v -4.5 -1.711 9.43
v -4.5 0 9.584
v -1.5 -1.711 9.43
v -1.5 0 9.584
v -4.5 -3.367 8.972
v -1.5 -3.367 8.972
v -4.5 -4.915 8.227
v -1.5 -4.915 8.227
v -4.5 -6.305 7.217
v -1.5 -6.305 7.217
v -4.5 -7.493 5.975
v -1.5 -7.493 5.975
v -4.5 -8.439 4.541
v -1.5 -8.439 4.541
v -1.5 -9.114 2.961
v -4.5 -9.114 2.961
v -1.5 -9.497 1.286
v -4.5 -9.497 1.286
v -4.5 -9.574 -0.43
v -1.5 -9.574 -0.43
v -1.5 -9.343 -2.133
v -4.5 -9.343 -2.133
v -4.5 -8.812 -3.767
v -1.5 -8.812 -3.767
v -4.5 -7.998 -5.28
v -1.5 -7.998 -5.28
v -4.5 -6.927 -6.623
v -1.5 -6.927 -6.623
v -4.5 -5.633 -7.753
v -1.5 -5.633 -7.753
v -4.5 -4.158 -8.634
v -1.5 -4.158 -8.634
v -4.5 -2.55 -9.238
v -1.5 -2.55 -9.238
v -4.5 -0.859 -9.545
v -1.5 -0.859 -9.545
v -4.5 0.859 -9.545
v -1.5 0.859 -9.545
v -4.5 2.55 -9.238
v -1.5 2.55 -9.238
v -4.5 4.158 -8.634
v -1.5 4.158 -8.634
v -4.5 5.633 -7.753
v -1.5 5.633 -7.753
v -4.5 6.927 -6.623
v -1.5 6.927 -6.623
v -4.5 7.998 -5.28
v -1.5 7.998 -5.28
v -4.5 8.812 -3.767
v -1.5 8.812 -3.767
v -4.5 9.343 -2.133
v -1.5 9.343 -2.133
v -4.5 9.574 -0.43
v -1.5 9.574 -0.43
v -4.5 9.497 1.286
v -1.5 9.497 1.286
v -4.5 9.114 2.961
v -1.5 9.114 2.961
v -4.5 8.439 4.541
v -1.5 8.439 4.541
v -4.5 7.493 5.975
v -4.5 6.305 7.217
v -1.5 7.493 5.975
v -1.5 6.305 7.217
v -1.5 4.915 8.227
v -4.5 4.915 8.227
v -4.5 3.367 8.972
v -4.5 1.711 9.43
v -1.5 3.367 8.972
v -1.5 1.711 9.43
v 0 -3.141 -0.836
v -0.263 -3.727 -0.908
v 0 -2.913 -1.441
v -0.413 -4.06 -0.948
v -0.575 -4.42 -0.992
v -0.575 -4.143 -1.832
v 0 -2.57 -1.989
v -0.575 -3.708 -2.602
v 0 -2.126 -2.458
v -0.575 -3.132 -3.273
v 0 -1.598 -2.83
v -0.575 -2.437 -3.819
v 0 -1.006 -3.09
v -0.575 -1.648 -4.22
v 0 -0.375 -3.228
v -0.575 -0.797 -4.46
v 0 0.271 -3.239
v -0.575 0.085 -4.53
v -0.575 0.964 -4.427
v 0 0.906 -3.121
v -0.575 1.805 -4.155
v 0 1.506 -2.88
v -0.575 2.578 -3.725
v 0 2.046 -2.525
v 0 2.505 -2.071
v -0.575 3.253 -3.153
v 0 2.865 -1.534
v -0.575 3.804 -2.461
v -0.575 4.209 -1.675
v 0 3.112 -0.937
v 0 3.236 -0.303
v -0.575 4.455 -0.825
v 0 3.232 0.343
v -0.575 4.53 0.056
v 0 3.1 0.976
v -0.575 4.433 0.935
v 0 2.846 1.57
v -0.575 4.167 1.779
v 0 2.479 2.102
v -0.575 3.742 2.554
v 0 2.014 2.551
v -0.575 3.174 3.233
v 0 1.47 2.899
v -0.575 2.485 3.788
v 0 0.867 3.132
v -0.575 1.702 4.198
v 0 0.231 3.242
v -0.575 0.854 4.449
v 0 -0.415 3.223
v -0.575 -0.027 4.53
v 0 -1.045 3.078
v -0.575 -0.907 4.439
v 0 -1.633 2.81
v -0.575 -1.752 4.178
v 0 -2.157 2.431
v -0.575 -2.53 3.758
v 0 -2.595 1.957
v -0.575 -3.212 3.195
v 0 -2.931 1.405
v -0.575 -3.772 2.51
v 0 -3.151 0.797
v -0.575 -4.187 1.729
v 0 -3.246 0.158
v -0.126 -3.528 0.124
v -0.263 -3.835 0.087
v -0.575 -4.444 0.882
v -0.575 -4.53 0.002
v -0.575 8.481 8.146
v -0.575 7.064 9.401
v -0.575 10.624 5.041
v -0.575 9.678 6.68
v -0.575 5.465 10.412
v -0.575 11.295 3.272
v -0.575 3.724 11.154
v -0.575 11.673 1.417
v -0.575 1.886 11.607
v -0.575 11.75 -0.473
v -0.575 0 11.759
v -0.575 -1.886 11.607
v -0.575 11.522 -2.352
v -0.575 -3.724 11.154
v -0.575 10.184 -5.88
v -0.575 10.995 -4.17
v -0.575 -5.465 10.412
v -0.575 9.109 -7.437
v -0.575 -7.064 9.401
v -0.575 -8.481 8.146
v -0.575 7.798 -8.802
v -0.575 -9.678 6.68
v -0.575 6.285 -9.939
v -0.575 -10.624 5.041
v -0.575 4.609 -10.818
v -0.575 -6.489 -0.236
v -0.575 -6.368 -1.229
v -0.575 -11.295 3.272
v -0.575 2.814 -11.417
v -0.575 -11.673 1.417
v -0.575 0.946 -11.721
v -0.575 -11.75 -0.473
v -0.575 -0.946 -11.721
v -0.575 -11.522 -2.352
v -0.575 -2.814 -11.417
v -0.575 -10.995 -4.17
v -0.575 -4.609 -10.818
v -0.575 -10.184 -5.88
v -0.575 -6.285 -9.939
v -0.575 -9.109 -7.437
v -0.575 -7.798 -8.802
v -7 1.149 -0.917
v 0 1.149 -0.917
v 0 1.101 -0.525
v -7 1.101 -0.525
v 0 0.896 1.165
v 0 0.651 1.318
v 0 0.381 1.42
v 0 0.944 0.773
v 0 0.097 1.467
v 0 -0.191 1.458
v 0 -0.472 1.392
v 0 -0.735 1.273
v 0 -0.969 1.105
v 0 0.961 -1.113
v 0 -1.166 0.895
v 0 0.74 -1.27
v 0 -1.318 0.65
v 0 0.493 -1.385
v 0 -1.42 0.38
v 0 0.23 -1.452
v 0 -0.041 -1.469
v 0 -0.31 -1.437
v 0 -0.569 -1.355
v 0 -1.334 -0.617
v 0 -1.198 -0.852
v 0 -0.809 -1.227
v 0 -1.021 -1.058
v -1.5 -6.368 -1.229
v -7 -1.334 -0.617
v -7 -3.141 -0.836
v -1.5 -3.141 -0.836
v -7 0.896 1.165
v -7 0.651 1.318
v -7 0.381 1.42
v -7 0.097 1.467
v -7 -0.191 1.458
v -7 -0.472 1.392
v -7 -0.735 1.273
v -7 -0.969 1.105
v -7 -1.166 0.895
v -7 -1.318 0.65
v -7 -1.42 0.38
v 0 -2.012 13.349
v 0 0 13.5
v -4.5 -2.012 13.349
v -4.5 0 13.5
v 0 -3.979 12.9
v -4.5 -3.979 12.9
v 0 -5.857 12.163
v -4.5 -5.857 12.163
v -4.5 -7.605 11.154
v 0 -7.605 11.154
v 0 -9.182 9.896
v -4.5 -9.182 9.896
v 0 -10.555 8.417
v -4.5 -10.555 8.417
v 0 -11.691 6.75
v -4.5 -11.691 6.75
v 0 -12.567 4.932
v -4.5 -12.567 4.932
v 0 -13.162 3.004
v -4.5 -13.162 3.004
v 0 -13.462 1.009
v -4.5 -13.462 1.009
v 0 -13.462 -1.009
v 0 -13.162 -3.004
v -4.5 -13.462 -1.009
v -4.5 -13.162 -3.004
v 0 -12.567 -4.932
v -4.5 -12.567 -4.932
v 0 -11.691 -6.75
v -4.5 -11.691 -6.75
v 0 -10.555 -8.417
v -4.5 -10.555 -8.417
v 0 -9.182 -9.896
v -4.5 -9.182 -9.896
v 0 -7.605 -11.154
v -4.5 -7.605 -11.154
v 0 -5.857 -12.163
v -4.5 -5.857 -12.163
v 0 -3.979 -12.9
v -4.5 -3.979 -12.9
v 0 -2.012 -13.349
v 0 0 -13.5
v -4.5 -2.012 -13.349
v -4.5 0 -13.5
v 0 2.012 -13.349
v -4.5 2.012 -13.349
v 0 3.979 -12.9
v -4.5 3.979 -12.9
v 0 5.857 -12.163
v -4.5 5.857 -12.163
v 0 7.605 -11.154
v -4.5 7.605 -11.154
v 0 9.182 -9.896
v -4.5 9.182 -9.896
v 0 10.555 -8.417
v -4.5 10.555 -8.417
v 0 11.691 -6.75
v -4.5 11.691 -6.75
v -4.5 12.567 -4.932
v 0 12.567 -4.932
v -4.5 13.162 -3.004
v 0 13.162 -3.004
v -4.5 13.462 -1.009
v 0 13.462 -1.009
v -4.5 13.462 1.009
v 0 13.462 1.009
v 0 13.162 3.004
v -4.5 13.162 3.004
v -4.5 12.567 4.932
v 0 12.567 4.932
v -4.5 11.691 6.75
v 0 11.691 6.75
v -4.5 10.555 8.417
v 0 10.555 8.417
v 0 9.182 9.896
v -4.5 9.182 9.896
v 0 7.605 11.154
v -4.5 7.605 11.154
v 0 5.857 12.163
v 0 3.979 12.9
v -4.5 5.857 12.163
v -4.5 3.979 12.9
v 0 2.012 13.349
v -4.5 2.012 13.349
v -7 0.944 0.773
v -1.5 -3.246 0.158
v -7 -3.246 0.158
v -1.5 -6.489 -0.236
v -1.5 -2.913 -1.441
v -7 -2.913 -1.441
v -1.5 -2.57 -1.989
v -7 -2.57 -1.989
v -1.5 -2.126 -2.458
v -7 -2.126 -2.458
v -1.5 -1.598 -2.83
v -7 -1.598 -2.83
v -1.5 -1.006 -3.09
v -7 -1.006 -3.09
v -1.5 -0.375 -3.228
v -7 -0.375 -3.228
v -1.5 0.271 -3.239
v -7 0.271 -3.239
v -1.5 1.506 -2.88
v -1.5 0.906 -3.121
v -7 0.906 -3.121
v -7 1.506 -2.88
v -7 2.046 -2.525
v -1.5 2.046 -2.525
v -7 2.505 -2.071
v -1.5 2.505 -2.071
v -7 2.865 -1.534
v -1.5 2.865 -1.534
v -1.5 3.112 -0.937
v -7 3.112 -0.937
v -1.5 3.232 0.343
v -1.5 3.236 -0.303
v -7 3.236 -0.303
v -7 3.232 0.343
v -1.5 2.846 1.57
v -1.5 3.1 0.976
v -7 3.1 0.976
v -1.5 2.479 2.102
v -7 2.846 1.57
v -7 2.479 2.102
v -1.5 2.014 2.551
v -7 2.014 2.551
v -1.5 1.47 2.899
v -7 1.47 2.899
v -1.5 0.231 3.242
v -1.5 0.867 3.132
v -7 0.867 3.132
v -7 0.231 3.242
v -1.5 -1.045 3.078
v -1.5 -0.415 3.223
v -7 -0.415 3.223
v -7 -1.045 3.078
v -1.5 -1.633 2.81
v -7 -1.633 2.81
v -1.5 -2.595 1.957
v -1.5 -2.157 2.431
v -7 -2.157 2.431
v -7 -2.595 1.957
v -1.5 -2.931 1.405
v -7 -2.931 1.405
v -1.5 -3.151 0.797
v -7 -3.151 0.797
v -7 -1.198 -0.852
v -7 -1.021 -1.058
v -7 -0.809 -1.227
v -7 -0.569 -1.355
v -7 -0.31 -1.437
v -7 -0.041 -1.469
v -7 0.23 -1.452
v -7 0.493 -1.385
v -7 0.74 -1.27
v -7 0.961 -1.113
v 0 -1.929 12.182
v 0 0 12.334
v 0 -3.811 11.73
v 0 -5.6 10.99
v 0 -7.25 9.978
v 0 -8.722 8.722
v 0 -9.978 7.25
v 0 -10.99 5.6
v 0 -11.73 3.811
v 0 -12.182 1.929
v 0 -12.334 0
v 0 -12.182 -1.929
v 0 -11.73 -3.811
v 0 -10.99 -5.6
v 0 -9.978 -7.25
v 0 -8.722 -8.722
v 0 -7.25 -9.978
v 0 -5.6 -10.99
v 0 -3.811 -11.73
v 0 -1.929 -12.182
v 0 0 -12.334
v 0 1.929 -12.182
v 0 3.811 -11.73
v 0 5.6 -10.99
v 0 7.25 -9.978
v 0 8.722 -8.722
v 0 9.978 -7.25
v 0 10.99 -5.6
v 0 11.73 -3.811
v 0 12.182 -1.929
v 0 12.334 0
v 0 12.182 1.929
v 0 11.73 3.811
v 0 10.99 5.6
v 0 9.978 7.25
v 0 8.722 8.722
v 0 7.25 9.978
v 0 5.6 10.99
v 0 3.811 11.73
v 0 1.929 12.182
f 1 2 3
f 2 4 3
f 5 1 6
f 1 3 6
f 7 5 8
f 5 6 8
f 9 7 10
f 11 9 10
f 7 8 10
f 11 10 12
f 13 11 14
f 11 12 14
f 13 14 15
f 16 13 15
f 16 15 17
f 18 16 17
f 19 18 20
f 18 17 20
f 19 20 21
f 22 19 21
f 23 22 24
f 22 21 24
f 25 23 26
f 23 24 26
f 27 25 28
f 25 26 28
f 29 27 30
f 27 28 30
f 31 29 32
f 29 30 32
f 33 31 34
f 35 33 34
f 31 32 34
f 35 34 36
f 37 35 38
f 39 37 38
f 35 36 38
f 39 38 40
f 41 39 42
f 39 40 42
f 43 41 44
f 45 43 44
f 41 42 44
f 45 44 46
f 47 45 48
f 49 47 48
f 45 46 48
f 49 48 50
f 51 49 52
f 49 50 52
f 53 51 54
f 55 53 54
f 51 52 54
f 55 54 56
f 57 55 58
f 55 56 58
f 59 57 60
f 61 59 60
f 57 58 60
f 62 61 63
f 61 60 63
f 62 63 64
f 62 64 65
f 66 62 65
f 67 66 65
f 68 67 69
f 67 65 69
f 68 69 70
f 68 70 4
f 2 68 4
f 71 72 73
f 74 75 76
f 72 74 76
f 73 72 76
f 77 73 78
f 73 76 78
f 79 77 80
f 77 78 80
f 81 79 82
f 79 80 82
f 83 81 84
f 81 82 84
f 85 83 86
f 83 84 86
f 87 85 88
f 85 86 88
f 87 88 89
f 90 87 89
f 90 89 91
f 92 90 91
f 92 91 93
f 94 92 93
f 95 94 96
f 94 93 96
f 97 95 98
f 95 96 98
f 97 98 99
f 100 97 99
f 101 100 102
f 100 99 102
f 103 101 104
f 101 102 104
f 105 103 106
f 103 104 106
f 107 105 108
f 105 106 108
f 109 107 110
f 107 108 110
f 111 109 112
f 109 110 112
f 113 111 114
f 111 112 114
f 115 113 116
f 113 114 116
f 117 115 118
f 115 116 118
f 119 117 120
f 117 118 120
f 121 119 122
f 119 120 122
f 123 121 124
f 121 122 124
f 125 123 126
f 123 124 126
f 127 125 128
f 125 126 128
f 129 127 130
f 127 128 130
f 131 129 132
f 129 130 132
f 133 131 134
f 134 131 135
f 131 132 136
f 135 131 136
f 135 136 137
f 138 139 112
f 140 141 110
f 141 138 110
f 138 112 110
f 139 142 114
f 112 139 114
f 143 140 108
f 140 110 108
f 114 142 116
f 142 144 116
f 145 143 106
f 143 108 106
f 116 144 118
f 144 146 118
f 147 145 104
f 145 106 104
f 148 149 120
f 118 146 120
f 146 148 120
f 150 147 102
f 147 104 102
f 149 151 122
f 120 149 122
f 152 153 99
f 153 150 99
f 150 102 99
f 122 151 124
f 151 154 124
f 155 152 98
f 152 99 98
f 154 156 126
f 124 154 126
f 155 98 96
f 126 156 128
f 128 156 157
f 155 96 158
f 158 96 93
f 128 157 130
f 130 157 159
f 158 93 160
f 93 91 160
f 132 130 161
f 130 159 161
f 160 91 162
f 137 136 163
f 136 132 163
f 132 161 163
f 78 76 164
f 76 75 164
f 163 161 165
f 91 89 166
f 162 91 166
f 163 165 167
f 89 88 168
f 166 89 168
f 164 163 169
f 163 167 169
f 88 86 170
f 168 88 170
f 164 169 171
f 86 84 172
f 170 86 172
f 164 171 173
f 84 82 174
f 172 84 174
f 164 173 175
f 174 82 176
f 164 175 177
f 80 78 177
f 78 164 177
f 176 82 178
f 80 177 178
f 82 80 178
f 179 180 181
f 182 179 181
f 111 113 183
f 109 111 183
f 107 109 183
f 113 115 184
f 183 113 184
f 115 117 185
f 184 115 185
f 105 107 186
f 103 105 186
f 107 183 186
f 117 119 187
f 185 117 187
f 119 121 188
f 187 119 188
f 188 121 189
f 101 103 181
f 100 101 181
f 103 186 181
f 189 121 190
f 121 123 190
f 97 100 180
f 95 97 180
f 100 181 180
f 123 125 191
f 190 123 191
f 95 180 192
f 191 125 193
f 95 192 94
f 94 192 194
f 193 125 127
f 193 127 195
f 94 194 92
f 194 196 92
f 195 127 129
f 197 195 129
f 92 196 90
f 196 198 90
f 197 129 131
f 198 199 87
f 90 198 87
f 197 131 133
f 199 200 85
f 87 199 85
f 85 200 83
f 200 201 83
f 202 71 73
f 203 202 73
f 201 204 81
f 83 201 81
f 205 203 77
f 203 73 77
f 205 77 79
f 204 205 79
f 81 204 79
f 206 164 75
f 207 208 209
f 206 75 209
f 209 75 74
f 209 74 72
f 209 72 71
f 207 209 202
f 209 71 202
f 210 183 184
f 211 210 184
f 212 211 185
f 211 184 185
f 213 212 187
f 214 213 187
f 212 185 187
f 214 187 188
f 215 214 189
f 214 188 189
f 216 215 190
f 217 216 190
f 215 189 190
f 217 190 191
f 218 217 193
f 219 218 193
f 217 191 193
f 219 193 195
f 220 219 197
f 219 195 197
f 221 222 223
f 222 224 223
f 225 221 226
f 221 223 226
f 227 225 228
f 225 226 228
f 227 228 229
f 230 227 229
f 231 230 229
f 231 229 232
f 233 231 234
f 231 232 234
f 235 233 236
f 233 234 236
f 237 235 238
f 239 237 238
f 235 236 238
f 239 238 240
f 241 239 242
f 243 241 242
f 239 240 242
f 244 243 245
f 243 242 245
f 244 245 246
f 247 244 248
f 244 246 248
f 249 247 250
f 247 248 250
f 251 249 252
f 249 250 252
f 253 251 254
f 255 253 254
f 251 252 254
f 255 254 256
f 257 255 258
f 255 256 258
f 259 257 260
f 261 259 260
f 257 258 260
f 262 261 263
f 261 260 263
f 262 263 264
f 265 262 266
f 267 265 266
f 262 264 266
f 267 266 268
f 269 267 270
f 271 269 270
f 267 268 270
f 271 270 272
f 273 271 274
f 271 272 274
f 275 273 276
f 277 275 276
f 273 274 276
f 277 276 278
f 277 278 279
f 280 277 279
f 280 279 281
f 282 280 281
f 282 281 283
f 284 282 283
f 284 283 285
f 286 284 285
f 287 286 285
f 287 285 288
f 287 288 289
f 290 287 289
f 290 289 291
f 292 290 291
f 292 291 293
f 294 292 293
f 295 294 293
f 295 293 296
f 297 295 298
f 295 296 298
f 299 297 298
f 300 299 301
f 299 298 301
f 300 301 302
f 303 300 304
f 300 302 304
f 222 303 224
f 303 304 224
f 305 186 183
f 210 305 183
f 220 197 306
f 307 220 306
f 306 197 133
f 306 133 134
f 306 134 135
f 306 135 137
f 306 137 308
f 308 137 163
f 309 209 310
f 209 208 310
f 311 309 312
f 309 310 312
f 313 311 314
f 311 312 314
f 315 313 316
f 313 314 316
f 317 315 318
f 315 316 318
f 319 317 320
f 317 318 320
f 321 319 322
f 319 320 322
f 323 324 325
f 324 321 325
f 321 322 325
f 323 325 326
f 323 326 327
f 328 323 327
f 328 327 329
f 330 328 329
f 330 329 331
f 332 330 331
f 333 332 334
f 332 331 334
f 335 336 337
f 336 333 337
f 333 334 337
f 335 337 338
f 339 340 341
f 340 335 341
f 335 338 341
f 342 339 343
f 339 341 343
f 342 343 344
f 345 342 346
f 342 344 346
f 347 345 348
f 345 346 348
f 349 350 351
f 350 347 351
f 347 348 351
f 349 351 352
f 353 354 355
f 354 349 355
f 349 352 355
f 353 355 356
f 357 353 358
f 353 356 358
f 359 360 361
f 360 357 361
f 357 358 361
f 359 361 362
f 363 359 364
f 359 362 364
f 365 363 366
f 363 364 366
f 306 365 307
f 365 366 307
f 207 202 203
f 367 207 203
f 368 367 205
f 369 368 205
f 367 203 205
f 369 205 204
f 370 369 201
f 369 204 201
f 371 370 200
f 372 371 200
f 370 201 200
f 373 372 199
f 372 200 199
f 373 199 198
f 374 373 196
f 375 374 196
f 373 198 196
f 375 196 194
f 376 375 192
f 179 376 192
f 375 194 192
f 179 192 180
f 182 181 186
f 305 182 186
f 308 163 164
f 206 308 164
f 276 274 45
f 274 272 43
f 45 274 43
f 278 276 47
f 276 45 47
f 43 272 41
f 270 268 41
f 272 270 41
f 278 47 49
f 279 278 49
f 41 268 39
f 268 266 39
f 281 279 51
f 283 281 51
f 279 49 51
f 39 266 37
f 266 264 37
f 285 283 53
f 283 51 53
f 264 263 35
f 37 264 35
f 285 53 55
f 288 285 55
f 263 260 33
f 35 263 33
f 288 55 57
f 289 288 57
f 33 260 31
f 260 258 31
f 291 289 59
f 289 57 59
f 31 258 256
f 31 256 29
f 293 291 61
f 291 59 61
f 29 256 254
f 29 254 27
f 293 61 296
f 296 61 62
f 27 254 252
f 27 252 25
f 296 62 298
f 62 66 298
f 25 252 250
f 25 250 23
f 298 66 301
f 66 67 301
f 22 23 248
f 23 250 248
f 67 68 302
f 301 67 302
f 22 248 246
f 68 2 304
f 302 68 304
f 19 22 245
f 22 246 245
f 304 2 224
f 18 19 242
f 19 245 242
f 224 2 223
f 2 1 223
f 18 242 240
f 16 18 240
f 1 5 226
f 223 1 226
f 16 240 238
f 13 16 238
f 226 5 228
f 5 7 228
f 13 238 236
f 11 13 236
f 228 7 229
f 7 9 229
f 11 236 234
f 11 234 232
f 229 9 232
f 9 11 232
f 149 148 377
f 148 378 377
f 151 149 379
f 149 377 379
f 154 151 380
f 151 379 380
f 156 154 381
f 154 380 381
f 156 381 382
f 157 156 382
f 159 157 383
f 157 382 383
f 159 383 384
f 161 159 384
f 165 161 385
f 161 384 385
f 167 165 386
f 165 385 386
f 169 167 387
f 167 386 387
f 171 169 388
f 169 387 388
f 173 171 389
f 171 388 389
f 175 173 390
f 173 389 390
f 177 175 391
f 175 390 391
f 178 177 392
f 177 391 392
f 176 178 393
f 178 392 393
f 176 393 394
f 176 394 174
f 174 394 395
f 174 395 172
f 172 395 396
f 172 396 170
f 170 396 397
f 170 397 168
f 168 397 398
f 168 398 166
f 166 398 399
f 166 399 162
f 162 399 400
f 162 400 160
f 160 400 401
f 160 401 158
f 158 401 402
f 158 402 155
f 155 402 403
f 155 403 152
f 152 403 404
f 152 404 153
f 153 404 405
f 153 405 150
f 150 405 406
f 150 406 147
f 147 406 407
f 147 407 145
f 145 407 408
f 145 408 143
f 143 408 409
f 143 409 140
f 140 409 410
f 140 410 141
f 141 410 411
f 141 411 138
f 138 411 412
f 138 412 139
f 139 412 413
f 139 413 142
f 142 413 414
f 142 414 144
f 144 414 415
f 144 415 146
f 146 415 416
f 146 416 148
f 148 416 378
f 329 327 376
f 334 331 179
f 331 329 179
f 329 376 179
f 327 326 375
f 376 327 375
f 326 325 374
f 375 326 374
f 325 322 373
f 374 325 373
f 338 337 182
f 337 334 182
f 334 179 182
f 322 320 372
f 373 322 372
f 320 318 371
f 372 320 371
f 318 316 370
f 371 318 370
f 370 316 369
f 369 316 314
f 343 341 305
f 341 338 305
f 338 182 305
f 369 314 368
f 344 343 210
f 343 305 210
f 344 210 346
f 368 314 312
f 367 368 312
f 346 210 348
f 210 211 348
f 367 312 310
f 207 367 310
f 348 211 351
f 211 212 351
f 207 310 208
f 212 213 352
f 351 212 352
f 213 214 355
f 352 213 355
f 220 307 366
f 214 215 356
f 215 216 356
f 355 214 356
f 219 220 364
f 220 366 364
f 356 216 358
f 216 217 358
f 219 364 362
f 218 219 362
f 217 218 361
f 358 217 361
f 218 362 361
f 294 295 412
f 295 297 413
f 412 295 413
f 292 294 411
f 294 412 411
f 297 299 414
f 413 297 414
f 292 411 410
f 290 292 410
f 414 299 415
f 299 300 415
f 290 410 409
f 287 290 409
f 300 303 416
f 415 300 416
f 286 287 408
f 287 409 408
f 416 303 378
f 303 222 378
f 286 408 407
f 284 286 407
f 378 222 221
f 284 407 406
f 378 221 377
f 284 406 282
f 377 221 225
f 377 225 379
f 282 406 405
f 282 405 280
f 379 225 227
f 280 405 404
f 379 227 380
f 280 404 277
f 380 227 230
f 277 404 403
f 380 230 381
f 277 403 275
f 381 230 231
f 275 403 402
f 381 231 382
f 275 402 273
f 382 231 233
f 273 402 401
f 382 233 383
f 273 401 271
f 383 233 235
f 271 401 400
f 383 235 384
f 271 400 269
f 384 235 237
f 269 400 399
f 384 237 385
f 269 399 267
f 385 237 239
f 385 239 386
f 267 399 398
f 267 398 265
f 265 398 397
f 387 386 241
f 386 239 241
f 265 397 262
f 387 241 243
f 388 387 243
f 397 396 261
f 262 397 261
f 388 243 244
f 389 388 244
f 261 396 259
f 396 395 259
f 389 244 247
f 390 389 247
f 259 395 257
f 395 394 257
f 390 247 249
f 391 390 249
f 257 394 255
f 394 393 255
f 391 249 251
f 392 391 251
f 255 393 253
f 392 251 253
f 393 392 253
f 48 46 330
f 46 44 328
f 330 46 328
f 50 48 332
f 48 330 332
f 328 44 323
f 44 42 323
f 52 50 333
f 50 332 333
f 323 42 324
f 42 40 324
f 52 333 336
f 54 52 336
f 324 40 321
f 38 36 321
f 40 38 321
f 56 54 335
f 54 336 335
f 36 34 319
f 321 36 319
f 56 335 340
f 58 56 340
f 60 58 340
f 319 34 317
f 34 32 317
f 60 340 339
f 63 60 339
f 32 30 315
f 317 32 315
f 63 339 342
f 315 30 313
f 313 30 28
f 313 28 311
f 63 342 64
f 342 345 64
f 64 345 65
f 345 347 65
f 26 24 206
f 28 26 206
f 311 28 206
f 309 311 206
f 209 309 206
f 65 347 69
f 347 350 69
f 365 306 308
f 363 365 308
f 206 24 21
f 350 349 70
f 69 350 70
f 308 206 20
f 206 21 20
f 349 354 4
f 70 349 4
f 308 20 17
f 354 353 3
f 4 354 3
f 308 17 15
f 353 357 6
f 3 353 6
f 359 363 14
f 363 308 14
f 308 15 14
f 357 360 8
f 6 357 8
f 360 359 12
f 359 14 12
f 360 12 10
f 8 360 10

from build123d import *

# Parameters (mm, degrees)
CORTAR_EXTRUIR1_DEPTH = 10


with BuildPart() as part:
    # Croquis1 → Revolución2 (revolve)
    with BuildSketch(Plane.XY, mode=Mode.PRIVATE) as revoluci_n2_sk:
        Polygon((0, 12.334092632), (0, 13.5), (-4.5, 13.5), (-4.5, 9.583549686), (-1.5, 9.583549686), (-1.5, 3.25), (-7, 3.25), (-7, 0), (0, 0), (0, 3.25), (-0.574918787, 4.530302725), (-0.574918787, 11.759173845), align=None)
    revolve(revoluci_n2_sk.sketch.rotate(Axis((-7, 0, 0), (1, 0, 0)), 90), axis=Axis((-7, 0, 0), (1, 0, 0)))

    # Croquis2 → Cortar-Extruir1 (cut)
    with BuildSketch(Plane(origin=(0, 0, 0), x_dir=(0, 0, -1), z_dir=(1, 0, 0))):
        with BuildLine():
            Line((0.916823697, 1.149058009), (0.524737182, 1.101385895))
            Line((0.524737182, 1.101385895), (-0.77337267, 0.943554298))
            Line((-0.77337267, 0.943554298), (-1.165459185, 0.895882184))
            ThreePointArc((-1.165459185, 0.895882184), (-1.392146699, -0.472046151), (-0.380201076, -1.419981388))
            Line((-0.380201076, -1.419981388), (0.236111814, -6.488940003))
            Line((0.236111814, -6.488940003), (1.228801228, -6.368243164))
            Line((1.228801228, -6.368243164), (0.616752973, -1.334359685))
            ThreePointArc((0.616752973, -1.334359685), (1.459385217, -0.176337142), (0.916823697, 1.149058009))
        make_face()
    extrude(amount=-CORTAR_EXTRUIR1_DEPTH, mode=Mode.SUBTRACT)


solid = part.part
